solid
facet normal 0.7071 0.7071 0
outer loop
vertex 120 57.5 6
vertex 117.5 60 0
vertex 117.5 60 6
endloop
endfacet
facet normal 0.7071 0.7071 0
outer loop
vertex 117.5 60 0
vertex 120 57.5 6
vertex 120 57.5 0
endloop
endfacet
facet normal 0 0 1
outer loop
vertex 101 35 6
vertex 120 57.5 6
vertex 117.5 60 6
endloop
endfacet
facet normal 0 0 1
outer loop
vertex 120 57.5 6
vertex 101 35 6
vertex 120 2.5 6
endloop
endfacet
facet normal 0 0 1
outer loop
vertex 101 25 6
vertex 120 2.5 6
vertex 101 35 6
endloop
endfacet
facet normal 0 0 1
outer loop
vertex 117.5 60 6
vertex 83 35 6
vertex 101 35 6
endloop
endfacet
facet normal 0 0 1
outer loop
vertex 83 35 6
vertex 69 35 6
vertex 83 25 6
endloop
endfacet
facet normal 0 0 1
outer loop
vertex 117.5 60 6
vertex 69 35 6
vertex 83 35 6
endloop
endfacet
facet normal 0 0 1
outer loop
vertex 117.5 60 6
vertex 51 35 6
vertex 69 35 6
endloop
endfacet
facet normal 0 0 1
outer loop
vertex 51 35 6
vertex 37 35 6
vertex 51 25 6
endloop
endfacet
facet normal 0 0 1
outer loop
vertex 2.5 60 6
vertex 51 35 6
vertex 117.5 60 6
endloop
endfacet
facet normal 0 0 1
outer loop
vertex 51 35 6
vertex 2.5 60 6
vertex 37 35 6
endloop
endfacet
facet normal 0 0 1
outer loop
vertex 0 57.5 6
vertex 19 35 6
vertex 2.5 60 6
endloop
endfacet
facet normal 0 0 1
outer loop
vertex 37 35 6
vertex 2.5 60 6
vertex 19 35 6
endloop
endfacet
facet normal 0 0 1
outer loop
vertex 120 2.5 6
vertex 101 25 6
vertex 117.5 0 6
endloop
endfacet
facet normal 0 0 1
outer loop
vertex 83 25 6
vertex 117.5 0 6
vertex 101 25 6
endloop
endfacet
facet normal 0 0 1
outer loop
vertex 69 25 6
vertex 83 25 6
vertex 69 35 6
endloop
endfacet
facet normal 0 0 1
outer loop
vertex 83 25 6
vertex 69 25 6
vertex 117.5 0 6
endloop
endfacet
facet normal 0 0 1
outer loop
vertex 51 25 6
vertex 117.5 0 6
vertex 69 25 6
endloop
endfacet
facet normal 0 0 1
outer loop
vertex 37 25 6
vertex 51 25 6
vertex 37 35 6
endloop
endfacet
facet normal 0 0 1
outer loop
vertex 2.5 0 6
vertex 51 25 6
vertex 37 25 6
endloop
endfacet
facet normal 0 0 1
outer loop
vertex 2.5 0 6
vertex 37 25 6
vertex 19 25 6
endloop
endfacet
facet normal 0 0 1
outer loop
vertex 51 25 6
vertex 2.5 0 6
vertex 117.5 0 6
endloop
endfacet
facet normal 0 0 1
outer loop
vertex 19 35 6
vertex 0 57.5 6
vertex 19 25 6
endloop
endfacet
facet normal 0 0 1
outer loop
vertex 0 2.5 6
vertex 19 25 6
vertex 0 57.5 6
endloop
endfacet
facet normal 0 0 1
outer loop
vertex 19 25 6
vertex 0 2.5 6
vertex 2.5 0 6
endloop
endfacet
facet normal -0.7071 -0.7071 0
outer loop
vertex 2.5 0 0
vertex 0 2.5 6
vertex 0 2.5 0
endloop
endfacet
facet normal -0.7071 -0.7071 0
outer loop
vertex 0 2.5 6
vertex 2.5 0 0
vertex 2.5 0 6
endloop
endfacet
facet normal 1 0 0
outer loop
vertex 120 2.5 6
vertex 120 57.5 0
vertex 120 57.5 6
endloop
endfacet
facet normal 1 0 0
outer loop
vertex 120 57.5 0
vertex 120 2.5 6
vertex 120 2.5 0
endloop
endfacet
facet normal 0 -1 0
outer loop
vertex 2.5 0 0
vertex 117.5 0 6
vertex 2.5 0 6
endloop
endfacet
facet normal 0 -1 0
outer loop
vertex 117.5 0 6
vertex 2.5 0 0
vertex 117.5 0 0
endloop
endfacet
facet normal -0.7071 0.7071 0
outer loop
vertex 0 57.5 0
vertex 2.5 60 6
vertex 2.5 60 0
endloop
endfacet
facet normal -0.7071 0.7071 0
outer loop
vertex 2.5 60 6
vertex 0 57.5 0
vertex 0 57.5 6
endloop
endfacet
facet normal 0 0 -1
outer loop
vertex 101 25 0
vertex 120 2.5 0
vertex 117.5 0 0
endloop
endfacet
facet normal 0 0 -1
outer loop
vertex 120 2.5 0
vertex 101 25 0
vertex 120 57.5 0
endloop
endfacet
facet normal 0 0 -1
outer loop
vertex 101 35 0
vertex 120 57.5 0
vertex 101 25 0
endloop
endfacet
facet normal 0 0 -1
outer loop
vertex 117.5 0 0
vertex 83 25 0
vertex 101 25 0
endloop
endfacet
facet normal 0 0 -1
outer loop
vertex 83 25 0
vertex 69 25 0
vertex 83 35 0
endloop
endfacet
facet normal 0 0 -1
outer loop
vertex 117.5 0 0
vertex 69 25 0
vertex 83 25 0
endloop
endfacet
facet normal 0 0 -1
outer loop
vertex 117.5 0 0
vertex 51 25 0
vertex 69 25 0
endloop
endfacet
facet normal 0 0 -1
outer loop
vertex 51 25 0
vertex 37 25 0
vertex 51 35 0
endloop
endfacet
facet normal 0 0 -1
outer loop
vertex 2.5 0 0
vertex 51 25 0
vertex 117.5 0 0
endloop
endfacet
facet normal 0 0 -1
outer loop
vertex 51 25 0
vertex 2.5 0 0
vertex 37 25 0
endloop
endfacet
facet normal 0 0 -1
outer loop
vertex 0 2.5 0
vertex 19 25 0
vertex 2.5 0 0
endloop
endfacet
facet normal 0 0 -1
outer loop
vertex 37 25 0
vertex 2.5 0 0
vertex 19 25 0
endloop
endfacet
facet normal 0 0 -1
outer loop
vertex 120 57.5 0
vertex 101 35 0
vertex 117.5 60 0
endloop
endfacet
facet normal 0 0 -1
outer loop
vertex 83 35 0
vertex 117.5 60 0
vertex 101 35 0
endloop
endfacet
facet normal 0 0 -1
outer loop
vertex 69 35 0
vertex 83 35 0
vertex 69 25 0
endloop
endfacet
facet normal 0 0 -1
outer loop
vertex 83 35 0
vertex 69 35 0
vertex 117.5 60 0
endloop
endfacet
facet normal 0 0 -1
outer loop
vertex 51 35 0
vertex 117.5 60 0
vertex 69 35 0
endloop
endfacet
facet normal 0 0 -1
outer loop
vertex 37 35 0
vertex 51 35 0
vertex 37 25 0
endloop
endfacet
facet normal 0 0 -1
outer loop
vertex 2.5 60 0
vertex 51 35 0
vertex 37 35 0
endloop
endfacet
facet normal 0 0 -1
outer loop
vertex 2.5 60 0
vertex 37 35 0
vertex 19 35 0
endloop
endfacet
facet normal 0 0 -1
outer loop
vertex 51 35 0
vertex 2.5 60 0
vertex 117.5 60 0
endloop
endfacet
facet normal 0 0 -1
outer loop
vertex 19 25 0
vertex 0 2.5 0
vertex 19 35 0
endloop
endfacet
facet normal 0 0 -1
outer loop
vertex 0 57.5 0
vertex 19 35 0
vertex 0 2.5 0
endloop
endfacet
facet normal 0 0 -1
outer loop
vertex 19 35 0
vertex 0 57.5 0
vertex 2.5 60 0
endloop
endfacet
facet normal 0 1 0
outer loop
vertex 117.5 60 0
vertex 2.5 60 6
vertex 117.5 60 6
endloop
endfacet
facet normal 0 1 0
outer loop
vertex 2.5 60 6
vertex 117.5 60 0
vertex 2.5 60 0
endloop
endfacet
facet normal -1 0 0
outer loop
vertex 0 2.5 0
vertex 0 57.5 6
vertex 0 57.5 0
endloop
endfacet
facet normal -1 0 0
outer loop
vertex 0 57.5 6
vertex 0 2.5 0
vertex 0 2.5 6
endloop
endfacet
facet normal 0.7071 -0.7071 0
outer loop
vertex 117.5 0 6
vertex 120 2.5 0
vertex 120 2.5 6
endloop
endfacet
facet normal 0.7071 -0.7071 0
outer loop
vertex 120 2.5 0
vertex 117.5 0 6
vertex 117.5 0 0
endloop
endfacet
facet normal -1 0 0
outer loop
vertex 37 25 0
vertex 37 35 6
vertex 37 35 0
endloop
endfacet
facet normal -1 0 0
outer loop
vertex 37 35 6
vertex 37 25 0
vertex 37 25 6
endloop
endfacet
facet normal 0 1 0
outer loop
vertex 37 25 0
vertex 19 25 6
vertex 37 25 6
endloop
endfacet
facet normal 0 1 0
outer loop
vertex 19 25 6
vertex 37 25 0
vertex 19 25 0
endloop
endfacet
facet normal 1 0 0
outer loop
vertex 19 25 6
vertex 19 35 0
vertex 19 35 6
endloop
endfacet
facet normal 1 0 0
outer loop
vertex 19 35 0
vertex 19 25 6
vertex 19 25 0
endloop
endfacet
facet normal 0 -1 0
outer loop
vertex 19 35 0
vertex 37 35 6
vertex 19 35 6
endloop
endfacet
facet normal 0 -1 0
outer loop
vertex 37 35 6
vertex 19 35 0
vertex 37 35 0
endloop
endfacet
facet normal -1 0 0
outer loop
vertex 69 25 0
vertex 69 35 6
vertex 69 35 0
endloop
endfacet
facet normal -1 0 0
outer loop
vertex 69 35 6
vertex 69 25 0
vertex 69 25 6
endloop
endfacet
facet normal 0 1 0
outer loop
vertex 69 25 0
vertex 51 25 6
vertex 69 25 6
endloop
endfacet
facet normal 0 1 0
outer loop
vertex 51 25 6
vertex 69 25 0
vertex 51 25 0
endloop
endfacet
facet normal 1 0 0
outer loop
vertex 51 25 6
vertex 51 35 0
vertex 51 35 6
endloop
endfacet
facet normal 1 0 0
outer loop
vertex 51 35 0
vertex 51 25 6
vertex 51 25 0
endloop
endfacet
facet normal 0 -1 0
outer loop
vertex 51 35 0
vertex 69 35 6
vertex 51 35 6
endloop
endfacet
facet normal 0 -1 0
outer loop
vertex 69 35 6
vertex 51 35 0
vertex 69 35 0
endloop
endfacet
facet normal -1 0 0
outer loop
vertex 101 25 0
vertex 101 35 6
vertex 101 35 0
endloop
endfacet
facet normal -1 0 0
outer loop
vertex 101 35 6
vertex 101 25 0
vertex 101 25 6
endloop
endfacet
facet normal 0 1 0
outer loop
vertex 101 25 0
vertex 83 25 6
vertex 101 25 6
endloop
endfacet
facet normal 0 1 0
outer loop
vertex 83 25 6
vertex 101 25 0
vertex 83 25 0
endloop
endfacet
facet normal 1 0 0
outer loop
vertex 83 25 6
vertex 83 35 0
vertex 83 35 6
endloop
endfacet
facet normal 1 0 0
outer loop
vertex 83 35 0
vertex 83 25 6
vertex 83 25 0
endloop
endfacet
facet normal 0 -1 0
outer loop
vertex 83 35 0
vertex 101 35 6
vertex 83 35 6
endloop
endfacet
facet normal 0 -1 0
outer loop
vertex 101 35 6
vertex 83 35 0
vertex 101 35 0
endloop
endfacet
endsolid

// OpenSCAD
$fn = 32;

// ----------------------------------------------------------------------
// Windowed plate: 3 voids, 120 x 60 x 6 mm
// ----------------------------------------------------------------------

// --- parameters (mm) ---
plate_l = 120;            // plate length, X
plate_w = 60;             // plate width, Y
plate_t = 6;              // plate thickness, Z
edge_margin = 12;         // wall from the plate edge to any window
windows = 3;              // number of windows in the row
win_l = 18;               // window length
win_w = 10;               // window width
win_pitch = 32;           // window pitch along X
depth_1 = 6;              // depth of void 1 (full thickness = through)
depth_2 = 6;              // depth of void 2 (full thickness = through)
depth_3 = 6;              // depth of void 3 (full thickness = through)
corner_c = 2.5;           // corner chamfer of the plate

profile = [[2.5, 0], [117.5, 0], [120, 2.5], [120, 57.5], [117.5, 60], [2.5, 60], [0, 57.5], [0, 2.5]];  // primary outline, 8 points, counter clockwise
void_1 = [[19, 25], [37, 25], [37, 35], [19, 35]];  // window 1 of the row, 4 points
void_2 = [[51, 25], [69, 25], [69, 35], [51, 35]];  // window 2 of the row, 4 points
void_3 = [[83, 25], [101, 25], [101, 35], [83, 35]];  // window 3 of the row, 4 points

// --- the one profile operation ---
difference() {
  linear_extrude(height = plate_t) polygon(points = profile);
  translate([0, 0, -1])
    linear_extrude(height = plate_t + 2) polygon(points = void_1);
  translate([0, 0, -1])
    linear_extrude(height = plate_t + 2) polygon(points = void_2);
  translate([0, 0, -1])
    linear_extrude(height = plate_t + 2) polygon(points = void_3);
}
